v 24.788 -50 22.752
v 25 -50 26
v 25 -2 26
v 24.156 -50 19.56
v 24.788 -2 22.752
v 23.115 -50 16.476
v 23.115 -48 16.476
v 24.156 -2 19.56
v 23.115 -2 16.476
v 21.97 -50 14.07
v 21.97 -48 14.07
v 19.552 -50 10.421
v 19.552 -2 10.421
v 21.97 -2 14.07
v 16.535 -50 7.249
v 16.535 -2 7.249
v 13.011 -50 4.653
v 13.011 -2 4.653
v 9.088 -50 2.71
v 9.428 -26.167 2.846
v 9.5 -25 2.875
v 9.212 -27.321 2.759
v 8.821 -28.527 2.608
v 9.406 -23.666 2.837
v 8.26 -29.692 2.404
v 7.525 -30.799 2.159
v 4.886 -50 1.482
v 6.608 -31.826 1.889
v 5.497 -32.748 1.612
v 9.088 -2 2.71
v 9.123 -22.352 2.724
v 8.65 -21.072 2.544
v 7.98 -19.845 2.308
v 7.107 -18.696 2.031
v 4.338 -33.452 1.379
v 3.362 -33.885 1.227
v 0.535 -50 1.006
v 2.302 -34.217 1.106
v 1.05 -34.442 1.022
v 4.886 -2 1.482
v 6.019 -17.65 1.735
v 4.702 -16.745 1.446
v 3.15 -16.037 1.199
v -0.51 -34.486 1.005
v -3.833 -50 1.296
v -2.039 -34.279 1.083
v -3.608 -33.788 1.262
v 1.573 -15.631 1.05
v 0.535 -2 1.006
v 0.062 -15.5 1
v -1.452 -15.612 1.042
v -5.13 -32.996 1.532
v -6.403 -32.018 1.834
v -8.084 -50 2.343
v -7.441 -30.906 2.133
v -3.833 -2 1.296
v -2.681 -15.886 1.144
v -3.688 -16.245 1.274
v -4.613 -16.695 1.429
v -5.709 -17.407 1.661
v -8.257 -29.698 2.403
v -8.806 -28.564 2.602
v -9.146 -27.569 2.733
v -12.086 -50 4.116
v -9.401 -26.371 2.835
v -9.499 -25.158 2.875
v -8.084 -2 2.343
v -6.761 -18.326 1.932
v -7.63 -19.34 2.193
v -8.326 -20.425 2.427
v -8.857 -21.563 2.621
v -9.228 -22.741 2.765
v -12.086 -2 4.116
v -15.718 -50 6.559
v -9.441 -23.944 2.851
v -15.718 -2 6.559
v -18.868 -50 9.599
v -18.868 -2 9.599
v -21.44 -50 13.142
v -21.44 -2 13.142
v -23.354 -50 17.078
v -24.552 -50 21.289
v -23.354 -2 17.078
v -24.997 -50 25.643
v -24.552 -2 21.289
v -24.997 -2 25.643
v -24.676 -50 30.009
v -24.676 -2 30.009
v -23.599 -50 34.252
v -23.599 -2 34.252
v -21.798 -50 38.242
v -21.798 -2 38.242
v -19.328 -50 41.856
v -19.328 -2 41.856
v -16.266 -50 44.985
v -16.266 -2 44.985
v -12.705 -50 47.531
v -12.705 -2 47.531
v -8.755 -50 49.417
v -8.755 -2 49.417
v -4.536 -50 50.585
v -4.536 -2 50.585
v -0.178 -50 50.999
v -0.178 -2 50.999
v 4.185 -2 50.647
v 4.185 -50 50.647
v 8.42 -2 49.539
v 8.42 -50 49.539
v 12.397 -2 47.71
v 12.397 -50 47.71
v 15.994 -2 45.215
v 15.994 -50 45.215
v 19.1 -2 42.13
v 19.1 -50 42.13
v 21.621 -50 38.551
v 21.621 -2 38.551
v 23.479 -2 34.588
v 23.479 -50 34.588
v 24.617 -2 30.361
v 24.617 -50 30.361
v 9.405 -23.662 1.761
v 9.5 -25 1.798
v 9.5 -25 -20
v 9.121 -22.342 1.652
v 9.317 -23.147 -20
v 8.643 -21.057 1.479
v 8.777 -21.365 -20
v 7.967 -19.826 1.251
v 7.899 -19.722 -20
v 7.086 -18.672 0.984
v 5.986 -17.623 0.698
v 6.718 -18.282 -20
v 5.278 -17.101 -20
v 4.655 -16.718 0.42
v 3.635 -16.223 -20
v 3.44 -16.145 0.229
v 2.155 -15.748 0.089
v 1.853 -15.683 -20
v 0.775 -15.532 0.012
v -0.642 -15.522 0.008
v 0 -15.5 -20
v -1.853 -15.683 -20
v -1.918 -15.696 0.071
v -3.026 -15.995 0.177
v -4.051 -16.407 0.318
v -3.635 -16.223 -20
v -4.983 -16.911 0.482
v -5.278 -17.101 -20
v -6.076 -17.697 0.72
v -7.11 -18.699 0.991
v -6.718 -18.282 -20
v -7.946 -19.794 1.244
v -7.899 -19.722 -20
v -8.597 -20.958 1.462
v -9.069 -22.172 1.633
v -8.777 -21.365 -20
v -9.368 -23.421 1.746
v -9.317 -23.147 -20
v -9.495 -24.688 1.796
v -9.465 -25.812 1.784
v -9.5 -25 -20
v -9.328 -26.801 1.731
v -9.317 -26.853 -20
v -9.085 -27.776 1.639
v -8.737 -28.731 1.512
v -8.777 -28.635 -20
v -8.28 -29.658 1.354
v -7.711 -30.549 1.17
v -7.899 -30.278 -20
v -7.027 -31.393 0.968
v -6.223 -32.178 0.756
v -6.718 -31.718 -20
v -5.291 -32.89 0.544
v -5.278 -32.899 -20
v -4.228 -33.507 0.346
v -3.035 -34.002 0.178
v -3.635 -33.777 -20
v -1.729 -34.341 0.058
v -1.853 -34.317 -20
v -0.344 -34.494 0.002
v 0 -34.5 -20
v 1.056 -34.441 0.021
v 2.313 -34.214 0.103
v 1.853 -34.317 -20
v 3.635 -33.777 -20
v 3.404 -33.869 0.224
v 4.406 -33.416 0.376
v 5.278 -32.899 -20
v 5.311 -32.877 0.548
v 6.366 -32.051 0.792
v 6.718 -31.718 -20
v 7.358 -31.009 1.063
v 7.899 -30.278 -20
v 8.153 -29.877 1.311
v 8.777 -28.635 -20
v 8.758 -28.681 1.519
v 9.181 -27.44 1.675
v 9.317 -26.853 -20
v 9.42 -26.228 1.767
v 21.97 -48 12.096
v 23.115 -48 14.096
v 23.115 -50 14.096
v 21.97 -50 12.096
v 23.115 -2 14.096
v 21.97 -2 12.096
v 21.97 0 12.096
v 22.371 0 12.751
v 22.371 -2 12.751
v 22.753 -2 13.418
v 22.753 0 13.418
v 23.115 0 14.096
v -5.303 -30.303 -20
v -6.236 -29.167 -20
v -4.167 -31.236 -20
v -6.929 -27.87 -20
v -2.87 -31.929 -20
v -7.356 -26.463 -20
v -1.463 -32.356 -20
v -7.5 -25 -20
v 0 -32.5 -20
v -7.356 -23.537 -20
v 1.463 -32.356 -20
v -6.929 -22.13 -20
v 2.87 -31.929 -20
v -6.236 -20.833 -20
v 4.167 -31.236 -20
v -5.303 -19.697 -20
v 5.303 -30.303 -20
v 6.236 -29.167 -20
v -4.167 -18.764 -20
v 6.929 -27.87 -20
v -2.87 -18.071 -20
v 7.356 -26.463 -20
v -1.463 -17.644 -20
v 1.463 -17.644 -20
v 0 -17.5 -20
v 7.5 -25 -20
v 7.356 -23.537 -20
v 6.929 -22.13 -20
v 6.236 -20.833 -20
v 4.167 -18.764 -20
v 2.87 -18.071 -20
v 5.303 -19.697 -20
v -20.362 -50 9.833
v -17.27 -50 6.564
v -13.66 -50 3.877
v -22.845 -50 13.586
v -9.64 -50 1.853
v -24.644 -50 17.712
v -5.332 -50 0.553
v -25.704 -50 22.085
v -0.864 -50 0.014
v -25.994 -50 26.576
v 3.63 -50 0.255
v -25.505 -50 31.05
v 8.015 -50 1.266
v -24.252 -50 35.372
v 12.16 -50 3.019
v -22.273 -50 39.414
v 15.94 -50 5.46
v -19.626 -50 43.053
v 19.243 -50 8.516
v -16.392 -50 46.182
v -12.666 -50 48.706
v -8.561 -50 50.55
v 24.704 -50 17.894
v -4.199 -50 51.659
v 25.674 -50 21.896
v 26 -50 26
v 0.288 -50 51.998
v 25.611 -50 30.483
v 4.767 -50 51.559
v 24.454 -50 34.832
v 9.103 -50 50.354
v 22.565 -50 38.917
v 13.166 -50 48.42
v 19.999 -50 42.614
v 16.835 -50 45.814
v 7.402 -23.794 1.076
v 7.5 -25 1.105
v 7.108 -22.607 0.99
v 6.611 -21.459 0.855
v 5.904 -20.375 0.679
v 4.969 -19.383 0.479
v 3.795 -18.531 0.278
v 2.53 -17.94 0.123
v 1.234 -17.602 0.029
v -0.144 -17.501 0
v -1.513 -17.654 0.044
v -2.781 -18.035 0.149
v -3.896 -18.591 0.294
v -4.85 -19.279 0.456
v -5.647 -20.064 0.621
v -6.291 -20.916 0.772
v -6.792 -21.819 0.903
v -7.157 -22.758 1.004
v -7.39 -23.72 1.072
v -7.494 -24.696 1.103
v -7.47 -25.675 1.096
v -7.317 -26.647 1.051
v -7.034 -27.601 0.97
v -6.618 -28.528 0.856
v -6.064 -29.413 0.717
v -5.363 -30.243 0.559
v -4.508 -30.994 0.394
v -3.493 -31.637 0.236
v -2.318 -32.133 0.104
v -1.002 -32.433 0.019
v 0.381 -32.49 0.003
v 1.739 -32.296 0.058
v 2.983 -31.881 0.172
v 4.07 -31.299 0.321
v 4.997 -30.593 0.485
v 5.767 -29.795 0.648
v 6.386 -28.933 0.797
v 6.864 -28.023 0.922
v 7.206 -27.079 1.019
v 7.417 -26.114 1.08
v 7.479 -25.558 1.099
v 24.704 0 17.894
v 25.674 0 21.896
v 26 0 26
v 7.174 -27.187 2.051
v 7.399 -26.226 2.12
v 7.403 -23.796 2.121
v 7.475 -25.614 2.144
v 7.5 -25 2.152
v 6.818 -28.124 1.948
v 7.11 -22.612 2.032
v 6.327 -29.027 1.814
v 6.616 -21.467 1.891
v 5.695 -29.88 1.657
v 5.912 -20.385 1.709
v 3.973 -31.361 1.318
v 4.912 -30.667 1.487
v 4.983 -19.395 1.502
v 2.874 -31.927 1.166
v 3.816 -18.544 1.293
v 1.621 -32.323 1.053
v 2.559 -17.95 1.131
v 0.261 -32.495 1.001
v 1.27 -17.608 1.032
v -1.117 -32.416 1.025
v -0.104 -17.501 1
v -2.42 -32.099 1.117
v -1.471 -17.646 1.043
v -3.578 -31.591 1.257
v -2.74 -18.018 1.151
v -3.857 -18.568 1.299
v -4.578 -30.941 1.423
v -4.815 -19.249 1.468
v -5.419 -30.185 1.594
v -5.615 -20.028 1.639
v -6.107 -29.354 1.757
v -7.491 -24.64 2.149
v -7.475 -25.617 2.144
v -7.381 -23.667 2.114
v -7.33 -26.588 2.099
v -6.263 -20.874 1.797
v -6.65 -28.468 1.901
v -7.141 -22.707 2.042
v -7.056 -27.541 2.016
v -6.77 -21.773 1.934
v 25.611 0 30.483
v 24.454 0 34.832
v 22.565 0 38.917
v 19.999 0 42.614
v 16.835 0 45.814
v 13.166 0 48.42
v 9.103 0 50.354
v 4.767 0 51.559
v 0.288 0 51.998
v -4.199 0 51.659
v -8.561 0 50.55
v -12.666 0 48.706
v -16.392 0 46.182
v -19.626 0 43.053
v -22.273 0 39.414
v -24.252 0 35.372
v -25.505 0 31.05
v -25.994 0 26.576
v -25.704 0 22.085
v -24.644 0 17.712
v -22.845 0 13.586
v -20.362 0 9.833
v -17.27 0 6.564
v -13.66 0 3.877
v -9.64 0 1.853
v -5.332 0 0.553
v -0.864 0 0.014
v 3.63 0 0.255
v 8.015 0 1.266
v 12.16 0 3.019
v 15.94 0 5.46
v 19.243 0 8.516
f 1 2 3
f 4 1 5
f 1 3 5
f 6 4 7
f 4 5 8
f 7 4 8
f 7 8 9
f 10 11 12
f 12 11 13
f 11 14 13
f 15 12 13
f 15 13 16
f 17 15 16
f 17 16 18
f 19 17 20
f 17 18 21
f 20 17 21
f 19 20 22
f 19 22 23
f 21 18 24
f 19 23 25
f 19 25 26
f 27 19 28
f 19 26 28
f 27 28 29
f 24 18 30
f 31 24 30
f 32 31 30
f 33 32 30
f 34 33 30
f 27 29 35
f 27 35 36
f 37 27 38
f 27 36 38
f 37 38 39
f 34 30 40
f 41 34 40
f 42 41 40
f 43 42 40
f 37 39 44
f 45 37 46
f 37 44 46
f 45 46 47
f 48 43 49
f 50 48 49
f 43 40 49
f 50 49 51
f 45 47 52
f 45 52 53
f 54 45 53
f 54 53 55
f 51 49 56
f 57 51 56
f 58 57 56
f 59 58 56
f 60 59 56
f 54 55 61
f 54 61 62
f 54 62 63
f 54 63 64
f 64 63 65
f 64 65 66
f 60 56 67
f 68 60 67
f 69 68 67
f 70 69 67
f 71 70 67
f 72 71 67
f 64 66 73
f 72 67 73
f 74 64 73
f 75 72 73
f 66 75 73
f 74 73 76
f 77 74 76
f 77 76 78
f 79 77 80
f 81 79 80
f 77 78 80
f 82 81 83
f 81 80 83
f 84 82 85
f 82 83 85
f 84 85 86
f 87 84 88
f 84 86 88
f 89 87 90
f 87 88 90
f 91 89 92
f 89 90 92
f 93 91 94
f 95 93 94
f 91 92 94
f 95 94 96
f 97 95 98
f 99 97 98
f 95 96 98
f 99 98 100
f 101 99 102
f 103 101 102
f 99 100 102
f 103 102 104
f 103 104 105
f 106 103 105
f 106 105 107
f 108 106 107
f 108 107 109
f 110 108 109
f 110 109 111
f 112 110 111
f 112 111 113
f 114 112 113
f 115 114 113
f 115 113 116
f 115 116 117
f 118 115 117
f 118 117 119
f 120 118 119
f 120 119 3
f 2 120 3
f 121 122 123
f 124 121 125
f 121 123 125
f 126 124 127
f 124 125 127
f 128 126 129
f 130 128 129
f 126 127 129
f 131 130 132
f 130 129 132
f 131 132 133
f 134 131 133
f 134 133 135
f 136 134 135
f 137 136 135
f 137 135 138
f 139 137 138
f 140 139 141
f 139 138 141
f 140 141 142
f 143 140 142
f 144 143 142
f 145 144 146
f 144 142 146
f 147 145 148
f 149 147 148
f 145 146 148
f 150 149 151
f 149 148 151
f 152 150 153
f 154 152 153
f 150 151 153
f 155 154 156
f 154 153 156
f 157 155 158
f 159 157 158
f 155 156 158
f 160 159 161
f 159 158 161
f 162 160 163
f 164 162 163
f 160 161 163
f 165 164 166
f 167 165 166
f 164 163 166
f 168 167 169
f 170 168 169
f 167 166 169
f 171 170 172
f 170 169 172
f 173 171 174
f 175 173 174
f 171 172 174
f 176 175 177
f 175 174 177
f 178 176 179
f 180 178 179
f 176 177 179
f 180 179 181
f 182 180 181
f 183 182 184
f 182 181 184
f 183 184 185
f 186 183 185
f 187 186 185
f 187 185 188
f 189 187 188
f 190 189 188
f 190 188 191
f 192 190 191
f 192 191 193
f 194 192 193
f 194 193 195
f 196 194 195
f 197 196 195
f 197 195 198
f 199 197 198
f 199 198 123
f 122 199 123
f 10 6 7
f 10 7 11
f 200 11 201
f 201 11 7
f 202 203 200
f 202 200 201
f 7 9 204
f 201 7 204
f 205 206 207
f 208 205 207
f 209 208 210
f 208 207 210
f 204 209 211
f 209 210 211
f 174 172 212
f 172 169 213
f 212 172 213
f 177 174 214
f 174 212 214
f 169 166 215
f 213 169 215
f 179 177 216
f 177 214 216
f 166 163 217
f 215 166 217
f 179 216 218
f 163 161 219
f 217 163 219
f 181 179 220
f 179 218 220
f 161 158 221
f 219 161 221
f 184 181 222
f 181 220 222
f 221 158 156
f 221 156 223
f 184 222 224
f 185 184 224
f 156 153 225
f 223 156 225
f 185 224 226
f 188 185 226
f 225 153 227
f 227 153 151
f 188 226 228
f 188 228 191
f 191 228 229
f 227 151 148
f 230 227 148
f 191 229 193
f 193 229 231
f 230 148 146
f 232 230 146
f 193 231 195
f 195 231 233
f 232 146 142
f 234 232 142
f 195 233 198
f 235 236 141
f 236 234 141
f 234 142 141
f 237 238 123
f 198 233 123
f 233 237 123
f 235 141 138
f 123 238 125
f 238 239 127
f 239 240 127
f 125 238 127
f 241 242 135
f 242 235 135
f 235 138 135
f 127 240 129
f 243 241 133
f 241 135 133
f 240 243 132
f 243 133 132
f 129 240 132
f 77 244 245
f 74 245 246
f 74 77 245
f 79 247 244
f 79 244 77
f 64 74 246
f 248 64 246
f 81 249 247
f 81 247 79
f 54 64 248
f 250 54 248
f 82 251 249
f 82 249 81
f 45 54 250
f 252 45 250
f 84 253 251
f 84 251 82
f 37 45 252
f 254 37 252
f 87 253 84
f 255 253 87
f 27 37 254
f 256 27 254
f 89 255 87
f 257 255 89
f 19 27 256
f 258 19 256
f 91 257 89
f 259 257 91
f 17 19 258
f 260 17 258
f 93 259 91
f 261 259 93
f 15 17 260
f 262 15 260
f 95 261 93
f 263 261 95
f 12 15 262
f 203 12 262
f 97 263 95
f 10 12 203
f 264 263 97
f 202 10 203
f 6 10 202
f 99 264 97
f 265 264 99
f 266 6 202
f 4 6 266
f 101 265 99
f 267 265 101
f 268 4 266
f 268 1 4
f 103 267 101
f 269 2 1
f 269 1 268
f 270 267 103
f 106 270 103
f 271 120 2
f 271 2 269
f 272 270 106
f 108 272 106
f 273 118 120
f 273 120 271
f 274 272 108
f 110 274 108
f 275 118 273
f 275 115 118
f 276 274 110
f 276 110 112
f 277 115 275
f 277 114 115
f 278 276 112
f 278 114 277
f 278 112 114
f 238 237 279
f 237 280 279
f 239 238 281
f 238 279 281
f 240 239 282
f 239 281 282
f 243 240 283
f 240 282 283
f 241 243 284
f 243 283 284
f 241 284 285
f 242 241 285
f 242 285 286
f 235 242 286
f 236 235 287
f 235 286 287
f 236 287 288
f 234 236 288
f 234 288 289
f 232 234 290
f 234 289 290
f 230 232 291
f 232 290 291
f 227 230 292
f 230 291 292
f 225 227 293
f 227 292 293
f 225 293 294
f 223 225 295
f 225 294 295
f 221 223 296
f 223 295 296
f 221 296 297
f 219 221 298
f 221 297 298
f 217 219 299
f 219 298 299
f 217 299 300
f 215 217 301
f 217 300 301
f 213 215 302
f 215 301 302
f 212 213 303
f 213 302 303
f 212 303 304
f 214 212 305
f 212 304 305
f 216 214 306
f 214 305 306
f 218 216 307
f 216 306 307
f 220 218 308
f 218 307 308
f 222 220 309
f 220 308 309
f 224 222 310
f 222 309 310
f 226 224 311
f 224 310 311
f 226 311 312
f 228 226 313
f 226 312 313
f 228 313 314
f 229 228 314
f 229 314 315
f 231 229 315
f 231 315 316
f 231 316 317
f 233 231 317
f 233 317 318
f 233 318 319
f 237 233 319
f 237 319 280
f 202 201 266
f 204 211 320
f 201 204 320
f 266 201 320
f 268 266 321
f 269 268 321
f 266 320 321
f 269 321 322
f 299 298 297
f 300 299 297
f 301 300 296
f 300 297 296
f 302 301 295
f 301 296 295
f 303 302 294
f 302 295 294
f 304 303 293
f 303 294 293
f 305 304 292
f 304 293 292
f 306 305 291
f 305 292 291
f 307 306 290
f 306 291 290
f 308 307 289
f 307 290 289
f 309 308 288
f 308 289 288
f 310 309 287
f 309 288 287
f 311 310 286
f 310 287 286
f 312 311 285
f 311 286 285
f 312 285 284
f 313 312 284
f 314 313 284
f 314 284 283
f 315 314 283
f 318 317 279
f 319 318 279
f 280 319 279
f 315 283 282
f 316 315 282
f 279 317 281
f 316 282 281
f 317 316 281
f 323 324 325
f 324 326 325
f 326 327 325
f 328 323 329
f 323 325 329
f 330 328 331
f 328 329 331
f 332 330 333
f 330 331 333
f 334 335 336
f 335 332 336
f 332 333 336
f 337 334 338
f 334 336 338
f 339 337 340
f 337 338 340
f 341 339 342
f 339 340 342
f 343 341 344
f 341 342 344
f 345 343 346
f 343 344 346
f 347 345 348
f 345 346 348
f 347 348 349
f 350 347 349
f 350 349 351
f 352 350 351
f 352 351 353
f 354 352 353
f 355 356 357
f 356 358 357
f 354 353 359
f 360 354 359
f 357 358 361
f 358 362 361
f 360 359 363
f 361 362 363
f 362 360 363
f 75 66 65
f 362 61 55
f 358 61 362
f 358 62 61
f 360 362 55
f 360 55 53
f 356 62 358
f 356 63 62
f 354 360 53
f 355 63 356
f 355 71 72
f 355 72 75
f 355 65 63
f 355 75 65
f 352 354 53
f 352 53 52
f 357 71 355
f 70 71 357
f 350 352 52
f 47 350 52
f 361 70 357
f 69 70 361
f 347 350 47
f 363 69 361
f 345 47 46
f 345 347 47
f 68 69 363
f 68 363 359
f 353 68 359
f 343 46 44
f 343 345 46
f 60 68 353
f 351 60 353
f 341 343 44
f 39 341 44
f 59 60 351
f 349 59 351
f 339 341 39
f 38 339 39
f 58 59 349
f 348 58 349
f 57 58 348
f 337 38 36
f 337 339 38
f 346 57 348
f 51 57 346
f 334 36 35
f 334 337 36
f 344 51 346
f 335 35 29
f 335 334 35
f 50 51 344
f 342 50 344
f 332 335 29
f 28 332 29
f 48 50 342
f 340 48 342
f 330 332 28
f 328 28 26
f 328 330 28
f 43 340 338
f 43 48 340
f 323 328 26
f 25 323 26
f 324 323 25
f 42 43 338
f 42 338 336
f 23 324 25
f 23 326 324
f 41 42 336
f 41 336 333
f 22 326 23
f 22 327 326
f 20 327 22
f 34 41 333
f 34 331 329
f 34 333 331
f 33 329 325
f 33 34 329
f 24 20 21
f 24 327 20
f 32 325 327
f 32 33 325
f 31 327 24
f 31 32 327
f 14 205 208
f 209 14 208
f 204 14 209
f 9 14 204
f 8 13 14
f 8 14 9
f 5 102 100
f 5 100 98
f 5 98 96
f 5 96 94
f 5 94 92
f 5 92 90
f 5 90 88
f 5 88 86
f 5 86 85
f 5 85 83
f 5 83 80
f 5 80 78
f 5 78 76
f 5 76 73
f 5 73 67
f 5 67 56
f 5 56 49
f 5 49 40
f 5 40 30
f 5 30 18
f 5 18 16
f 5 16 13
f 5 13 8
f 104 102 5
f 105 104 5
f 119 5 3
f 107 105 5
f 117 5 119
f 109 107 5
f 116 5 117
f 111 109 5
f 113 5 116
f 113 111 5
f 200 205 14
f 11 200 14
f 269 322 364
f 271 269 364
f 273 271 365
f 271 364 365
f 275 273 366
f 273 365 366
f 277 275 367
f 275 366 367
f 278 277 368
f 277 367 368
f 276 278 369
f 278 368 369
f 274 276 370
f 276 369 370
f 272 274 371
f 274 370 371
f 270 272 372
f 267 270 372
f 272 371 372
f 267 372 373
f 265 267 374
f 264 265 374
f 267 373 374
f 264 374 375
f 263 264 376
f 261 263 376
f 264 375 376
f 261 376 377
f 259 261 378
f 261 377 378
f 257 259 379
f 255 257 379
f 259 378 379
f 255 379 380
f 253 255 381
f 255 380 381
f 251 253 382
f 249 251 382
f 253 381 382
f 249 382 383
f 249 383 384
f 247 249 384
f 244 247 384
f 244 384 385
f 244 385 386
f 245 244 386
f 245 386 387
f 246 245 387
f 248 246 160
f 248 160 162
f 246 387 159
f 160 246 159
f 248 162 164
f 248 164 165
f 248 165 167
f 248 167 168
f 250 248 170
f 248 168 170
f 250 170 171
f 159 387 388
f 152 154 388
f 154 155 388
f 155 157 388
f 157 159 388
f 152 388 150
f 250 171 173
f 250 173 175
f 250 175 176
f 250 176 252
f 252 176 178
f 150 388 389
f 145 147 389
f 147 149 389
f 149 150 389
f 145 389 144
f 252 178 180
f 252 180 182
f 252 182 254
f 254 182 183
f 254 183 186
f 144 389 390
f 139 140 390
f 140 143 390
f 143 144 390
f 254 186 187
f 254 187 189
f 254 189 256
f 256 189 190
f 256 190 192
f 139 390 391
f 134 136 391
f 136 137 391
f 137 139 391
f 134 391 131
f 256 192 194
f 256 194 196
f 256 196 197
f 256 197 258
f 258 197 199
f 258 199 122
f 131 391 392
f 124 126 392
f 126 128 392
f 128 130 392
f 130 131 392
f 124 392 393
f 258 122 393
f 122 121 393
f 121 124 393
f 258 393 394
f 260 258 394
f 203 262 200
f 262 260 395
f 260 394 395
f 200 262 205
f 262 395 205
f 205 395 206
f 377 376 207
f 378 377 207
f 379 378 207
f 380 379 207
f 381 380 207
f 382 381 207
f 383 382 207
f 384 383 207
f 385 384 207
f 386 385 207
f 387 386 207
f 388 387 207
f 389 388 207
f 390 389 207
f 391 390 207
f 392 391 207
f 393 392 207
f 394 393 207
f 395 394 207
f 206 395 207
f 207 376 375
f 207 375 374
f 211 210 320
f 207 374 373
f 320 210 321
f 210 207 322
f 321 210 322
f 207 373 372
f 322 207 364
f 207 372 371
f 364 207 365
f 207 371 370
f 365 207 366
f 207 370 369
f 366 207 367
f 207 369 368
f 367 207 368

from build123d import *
from build123d import SkipClean  # not in build123d's __all__

# Parameters (mm, degrees)
F1_DEPTH = 2
F2_DEPTH = 50
F3_R     = 9.5
F3_R_2   = 7.5
F4_DEPTH = 5
F5_DEPTH = 20
F6_DEPTH = 60
F8_DEPTH = 2


# Not quite as in the source:
# - a feature names something its author has since deleted; it is built from what else it names


with BuildPart() as f1:
    # F0 (on Front) → F1 (new body)
    with BuildSketch(Plane.XZ):
        with BuildLine():
            Line((21.9700236311, 14.0702866067), (21.9700236311, 12.0961134337))
            ThreePointArc((21.9700236311, 12.0961134337), (22.5646192045, 13.0834230481), (23.1148758296, 14.0961134337))
            Line((23.1148758296, 14.0961134337), (23.1148758296, 16.4762131806))
            ThreePointArc((23.1148758296, 16.4762131806), (22.5745245911, 15.2579871773), (21.9700236311, 14.0702866067))
        make_face()
        with BuildLine():
            ThreePointArc((25, 26), (-24.2306684883, 32.1542428138), (21.9700236311, 14.0702866067))
            ThreePointArc((21.9700236311, 14.0702866067), (22.5745245911, 15.2579871773), (23.1148758296, 16.4762131806))
            ThreePointArc((23.1148758296, 16.4762131806), (24.5241910747, 21.1457181654), (25, 26))
        make_face()
    extrude(amount=F1_DEPTH)

    # F0 (on Front) → F2 (join)
    with BuildSketch(Plane.XZ):
        with BuildLine():
            ThreePointArc((23.1148758296, 14.0961134337), (25.2684266583, 19.8757356184), (26, 26))
            ThreePointArc((26, 26), (-24.9721906769, 33.2380724503), (21.9700236311, 12.0961134337))
            Line((21.9700236311, 12.0961134337), (21.9700236311, 14.0702866067))
            ThreePointArc((21.9700236311, 14.0702866067), (-24.2306684883, 32.1542428138), (25, 26))
            ThreePointArc((25, 26), (24.5241910747, 21.1457181654), (23.1148758296, 16.4762131806))
            Line((23.1148758296, 16.4762131806), (23.1148758296, 14.0961134337))
        make_face()
    extrude(amount=F2_DEPTH)

    # F3 (on Top) → F4 (join)
    with BuildSketch(Plane.XY):
        with Locations((0, -25)):
            Circle(F3_R)
        with Locations((0, -25)):
            Circle(F3_R_2, mode=Mode.SUBTRACT)
    with SkipClean():  # cleaning this boolean's faces spoils the solid; the shape is the same uncleaned
        extrude(amount=F4_DEPTH)

    # F3 (on Top) → F5 (join)
    with BuildSketch(Plane.XY):
        with Locations((0, -25)):
            Circle(F3_R)
        with Locations((0, -25)):
            Circle(F3_R_2, mode=Mode.SUBTRACT)
    extrude(amount=-F5_DEPTH)

    # F6 (cut): a face of the model
    f6_faces = [f1.faces().sort_by_distance(p)[0] for p in [
        (0.0283286742, -2, 25.9851504248),
    ]]
    extrude(f6_faces, amount=F6_DEPTH, mode=Mode.SUBTRACT)

    # F7 (on face) → F8 (join)
    with BuildSketch(Plane.XZ.offset(50)):
        Polygon((23.1148758296, 16.4762131806), (21.9700236311, 14.0702866067), (21.9700236311, 12.0961134337), (23.1148758296, 14.0961134337), align=None)
    extrude(amount=-F8_DEPTH)


solid = f1.part
